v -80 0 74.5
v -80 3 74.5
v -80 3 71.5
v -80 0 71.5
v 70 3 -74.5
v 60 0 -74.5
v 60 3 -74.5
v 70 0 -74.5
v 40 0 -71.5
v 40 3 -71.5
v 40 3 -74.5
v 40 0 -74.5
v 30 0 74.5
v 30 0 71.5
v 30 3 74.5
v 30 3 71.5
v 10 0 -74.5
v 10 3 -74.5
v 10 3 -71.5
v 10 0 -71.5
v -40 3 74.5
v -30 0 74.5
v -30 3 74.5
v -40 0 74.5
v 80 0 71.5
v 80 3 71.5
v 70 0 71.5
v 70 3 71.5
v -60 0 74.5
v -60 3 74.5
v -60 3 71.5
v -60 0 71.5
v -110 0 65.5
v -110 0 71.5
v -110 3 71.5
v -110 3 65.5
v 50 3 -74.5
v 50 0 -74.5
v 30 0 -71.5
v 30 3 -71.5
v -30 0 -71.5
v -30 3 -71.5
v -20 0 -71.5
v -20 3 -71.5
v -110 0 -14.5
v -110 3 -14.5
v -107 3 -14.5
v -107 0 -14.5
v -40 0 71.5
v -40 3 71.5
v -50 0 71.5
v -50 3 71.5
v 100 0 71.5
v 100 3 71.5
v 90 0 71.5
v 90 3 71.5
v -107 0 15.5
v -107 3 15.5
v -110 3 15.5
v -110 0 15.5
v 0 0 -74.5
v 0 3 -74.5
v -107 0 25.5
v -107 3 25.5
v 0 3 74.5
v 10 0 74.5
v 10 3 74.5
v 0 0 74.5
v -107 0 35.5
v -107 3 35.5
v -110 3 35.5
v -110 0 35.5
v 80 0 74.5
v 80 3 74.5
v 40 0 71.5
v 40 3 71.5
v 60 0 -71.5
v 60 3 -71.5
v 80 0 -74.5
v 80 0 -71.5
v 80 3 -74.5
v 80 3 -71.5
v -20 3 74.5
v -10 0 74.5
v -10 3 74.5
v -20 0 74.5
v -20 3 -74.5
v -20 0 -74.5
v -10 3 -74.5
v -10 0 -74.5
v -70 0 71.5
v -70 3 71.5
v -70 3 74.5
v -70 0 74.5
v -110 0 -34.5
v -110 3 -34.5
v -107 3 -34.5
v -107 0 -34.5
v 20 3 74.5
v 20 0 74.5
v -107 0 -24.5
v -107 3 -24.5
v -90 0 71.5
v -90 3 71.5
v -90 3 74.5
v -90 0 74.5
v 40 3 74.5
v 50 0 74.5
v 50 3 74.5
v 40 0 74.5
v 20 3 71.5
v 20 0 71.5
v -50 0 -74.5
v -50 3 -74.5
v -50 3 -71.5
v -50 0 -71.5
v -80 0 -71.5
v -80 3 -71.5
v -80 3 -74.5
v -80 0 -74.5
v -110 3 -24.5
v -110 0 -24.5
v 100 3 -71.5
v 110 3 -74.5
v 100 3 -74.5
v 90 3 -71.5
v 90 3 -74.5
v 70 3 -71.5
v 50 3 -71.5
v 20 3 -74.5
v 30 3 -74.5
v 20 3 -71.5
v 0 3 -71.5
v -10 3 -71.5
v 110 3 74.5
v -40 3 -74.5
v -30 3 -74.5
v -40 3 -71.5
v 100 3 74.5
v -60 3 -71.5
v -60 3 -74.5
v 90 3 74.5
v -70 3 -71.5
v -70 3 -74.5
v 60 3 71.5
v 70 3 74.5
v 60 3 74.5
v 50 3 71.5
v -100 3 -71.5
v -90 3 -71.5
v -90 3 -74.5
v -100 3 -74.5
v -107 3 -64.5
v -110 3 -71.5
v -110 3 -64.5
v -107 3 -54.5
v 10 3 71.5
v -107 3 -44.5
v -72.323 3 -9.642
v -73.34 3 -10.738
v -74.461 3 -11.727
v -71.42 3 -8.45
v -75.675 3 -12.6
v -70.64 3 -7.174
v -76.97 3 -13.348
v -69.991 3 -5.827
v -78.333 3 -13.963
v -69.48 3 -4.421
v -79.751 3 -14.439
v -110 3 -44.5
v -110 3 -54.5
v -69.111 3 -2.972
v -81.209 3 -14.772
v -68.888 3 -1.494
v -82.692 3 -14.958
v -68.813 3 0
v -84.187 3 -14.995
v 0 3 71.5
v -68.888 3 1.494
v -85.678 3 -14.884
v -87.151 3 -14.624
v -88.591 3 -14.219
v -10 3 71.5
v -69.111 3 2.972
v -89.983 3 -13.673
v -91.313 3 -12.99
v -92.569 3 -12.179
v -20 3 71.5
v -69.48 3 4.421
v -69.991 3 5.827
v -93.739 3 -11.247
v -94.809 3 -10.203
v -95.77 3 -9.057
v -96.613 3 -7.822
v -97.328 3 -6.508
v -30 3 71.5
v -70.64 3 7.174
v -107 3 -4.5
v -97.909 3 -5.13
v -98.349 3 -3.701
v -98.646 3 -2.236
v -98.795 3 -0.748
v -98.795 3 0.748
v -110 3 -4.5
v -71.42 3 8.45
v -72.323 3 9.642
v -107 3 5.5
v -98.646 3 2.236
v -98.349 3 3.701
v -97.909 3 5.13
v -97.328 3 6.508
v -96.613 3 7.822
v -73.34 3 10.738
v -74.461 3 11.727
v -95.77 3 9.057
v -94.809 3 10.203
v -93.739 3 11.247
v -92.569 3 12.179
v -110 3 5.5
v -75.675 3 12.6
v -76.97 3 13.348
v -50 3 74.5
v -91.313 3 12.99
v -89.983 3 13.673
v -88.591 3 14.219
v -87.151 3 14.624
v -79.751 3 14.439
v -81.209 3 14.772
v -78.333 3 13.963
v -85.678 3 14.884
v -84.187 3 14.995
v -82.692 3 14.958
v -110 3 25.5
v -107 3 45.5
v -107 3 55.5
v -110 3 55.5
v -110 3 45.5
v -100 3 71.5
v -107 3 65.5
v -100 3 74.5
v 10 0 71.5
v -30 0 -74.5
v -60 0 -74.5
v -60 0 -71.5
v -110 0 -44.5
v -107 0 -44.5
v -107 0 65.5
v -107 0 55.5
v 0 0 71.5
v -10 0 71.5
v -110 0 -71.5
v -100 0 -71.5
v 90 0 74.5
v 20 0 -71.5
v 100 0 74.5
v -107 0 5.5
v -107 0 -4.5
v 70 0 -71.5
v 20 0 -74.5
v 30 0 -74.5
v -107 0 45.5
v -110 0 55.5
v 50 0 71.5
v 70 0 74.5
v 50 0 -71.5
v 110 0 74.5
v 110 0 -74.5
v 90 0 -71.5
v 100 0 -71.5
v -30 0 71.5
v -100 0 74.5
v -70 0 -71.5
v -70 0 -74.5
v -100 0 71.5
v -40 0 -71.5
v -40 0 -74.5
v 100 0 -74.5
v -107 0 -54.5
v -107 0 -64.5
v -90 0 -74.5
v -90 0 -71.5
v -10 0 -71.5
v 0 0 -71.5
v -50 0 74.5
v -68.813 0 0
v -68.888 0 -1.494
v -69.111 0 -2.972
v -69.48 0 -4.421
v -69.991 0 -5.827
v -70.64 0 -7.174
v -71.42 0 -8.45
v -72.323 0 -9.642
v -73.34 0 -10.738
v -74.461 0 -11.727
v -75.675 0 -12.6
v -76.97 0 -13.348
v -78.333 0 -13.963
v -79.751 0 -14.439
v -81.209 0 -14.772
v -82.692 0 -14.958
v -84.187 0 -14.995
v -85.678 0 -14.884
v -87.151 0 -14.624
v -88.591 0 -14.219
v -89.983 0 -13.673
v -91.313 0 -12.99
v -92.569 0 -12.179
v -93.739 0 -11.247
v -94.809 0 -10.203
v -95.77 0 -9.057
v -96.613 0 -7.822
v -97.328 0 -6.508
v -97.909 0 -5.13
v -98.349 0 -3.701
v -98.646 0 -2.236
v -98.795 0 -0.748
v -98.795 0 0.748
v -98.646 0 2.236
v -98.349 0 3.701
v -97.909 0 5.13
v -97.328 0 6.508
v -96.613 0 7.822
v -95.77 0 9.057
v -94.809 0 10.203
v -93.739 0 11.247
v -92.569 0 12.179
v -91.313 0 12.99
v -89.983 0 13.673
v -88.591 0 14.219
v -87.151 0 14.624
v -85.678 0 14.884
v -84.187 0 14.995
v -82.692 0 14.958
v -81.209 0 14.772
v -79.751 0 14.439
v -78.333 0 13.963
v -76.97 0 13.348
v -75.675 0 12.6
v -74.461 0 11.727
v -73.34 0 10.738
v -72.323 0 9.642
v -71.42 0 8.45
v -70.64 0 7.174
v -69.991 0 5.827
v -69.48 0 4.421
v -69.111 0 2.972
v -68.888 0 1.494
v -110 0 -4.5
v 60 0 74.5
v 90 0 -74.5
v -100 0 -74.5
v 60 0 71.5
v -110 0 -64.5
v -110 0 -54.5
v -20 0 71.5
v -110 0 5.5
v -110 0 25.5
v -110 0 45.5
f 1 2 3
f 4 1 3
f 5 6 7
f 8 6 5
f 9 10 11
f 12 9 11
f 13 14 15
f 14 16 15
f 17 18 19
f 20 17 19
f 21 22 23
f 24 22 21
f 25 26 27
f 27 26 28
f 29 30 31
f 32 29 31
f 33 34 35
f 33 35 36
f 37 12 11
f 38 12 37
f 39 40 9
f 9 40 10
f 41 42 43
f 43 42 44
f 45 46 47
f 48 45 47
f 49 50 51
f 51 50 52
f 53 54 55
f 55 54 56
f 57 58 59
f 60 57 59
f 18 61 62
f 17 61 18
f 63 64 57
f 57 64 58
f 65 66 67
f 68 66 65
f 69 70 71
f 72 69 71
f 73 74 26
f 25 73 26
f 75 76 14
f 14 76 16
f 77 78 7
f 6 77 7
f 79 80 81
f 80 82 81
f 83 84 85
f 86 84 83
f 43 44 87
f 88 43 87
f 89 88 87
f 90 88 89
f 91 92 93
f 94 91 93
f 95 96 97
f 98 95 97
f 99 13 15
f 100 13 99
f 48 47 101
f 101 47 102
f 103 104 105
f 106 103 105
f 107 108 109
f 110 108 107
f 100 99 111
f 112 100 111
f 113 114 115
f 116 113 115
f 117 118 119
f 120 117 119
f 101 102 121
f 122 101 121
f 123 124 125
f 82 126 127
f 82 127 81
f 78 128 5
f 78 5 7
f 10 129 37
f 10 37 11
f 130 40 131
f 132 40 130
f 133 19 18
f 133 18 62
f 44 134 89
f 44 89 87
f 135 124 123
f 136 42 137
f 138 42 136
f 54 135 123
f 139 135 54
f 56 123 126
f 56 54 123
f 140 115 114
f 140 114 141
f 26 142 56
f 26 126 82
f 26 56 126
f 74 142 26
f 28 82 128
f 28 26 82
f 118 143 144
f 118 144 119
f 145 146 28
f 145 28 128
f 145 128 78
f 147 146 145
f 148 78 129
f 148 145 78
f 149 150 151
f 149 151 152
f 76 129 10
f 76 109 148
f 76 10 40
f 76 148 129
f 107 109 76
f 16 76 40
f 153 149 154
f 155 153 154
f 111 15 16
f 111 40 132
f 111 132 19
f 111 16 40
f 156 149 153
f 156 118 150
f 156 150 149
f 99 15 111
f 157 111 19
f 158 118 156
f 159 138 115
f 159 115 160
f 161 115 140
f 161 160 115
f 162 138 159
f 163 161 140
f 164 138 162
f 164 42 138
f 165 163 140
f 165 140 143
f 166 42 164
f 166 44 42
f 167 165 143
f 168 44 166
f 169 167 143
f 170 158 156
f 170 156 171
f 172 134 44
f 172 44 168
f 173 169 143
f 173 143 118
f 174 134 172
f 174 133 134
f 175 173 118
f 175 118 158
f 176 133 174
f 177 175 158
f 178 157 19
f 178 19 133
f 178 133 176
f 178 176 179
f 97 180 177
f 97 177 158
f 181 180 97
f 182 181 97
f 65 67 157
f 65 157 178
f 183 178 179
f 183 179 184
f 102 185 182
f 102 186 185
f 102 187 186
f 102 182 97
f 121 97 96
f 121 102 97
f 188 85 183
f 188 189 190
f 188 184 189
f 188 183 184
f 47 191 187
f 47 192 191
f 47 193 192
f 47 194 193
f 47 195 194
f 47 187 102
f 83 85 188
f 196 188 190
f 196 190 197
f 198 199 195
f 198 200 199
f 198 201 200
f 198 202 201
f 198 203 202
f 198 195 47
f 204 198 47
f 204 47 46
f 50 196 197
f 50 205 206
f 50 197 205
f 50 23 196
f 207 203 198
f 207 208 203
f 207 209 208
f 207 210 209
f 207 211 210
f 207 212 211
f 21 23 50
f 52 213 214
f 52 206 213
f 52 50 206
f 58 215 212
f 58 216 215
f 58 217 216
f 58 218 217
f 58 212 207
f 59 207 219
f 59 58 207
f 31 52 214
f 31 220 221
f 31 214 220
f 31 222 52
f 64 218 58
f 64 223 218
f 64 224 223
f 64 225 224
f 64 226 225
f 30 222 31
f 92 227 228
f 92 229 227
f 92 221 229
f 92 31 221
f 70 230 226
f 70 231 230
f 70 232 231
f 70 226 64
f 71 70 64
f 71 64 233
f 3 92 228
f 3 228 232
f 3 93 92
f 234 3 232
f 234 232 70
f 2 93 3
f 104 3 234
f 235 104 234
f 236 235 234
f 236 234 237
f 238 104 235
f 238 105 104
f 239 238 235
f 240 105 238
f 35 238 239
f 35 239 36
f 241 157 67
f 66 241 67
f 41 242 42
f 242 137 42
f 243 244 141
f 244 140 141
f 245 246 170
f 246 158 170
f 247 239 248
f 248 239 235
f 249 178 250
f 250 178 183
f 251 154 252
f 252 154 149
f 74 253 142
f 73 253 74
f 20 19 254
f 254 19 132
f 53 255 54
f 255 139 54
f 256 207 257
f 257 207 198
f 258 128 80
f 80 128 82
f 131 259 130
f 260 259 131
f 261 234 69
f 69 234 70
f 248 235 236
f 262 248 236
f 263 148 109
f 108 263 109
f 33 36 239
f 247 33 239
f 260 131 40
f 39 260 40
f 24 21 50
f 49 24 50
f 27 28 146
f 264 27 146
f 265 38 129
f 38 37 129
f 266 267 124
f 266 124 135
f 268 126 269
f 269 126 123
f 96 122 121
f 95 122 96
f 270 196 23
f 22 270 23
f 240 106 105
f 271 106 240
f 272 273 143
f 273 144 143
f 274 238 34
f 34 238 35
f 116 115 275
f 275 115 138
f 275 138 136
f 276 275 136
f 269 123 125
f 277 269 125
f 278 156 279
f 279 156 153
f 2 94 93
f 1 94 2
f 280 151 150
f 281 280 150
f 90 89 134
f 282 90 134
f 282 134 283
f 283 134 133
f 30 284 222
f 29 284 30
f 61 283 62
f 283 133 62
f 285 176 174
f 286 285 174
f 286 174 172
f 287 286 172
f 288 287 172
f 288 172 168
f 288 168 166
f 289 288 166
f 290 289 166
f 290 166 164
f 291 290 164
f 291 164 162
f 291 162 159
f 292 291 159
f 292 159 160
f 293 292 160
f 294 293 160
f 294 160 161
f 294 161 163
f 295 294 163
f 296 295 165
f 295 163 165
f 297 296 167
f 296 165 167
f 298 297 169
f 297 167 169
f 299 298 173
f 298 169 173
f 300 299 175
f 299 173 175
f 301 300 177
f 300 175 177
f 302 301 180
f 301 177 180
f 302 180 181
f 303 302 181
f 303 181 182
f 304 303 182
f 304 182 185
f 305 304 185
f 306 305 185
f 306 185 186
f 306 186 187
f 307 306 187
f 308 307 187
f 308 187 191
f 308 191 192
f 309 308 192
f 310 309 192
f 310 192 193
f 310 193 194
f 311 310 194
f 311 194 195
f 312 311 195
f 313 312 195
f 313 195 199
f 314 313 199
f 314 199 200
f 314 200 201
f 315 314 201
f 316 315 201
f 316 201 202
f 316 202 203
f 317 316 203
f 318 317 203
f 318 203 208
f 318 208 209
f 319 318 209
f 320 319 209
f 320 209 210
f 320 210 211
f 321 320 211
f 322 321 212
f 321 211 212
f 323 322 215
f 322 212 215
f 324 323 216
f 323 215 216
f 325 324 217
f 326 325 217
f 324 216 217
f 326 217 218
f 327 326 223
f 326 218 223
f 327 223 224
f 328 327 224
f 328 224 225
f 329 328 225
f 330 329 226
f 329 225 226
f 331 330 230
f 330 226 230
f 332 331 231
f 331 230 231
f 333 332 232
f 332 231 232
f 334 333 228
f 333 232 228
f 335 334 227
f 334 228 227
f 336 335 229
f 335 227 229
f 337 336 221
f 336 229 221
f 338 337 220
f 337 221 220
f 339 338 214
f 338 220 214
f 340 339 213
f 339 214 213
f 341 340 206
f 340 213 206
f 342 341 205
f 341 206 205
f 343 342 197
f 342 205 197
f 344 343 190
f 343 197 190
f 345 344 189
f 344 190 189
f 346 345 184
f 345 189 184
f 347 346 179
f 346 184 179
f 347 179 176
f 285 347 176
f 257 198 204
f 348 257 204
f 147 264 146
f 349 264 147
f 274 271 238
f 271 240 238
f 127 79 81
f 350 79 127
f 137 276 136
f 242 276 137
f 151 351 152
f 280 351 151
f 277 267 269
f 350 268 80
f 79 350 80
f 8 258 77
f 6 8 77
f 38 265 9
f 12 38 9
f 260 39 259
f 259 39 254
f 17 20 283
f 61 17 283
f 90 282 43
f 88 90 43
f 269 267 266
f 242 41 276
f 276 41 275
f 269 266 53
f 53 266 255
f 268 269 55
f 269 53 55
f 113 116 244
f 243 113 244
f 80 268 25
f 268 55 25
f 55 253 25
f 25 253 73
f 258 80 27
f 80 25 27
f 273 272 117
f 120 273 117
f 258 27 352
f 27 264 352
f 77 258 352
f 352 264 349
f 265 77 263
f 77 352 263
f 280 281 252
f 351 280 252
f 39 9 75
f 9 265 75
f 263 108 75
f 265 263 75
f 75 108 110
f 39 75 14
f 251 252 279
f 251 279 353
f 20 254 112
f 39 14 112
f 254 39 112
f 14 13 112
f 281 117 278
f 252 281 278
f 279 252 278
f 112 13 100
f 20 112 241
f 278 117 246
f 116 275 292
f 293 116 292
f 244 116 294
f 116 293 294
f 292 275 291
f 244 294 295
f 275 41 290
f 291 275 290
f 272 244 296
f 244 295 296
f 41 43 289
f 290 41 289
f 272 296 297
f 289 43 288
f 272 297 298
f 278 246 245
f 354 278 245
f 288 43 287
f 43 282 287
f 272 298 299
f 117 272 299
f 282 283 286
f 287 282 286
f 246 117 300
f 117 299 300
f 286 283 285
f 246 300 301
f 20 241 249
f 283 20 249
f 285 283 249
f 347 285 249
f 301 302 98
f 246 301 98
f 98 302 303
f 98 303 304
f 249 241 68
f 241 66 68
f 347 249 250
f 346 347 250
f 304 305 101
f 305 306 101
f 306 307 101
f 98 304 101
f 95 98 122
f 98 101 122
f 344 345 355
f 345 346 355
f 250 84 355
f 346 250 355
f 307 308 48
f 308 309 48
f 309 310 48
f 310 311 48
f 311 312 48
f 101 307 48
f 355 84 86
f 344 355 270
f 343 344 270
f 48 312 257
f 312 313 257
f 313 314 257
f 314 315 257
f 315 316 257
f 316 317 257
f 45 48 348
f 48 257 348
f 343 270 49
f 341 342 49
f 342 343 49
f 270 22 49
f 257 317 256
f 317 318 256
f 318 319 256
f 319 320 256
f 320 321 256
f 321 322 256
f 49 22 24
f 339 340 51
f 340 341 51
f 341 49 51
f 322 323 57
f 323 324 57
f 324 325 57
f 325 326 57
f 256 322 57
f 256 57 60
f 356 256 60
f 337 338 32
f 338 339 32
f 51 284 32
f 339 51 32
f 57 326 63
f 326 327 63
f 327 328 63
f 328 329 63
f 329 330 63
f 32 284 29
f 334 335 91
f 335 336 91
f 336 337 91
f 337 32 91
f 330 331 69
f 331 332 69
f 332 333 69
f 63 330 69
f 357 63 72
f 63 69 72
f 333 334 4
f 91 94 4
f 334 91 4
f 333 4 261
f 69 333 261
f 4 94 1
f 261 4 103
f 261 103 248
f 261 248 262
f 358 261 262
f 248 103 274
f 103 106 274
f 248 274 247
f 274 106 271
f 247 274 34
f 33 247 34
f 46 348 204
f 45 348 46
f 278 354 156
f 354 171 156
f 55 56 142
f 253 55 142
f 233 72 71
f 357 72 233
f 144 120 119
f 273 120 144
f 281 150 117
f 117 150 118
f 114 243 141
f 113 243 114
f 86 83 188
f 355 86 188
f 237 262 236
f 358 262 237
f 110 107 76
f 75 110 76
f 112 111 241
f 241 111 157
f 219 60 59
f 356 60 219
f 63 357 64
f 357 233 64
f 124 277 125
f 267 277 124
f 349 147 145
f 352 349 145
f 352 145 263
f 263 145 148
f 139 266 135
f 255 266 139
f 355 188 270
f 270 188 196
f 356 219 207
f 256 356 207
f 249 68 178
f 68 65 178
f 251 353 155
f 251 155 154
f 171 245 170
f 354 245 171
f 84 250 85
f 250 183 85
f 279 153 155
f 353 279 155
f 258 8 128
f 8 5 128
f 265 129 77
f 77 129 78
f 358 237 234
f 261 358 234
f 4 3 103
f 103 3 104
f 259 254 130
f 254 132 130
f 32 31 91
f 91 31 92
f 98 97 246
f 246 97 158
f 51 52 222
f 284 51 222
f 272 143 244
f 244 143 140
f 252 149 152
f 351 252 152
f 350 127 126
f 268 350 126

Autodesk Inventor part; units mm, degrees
ref_plane "YZ Plane" through (0, 0, 0) normal (1, 0, 0) x (0, 1, 0)
ref_plane "XZ Plane" through (0, 0, 0) normal (0, 1, 0) x (-1, 0, 0)
ref_plane "XY Plane" through (0, 0, 0) normal (0, 0, 1) x (1, 0, 0)
sketch "Эскиз5" plane through (0, 0, 0) normal (0, 1, 0) x (-1, 0, 0)
  line L0 (-110, 74.5) -> (110, 74.5)
  line L1 (110, 74.5) -> (110, -74.5)
  line L2 (110, -74.5) -> (-110, -74.5)
  line L3 (-110, -74.5) -> (-110, 74.5)
  line L4 (-110, 74.5) -> (110, -74.5) construction
  line L5 (110, 74.5) -> (-110, -74.5) construction
  point P0 (0, 0)
  dimension "d25" = 220
  dimension "d26" = 149
extrude "Выдавливание5" add sketch "Эскиз5" along normal blind 3
sketch "Эскиз6" plane through (0, 3, 0) normal (0, 1, 0) x (1, 0, 0)
  line L0 (-110, 74.5) -> (-110, -74.5) projected
  line L1 (-110, -65.5) -> (-107, -65.5)
  line L2 (-107, -65.5) -> (-107, -55.5)
  line L3 (-107, -55.5) -> (-110, -55.5)
  line L4 (-110, -55.5) -> (-110, -65.5)
  line L5 (-110, -74.5) -> (110, -74.5) projected
  point P0 (0, 0)
  point P1 (-107, -74.5)
  point P2 (-110, -65.5)
  dimension "d29" = 3
  dimension "d30" = 10
  dimension "d46" = 9
extrude "Выдавливание6" cut sketch "Эскиз6" against normal blind 3
pattern_linear "Прямоуг.массив6" count 7 spacing 20 along (0, 0, -1) of "Выдавливание6"
sketch "Эскиз8" plane through (0, 3, 0) normal (0, 1, 0) x (1, 0, 0)
  line L0 (-110, -74.5) -> (110, -74.5) projected
  line L1 (-110, -74.5) -> (-100, -74.5)
  line L2 (-100, -74.5) -> (-100, -71.5)
  line L3 (-100, -71.5) -> (-110, -71.5)
  line L4 (-110, -71.5) -> (-110, -74.5)
  line L5 (-107, -55.5) -> (-107, -65.5) projected
  point P0 (0, 0)
  dimension "d50" = 3
  dimension "d51" = 10
  dimension "d52" = 3
extrude "Выдавливание8" cut sketch "Эскиз8" against normal blind 3
pattern_linear "Прямоуг.массив7" count 11 spacing 20 along (1, 0, 0) of "Выдавливание8"
mirror "Зеркальное отражение2" about plane through (0, 0, 0) normal (0, 0, 1) of "Выдавливание8", "Прямоуг.массив7"
sketch "Эскиз9" plane through (0, 3, 0) normal (0, 1, 0) x (1, 0, 0)
  circle A0 centre (-83.8133, 0) radius 15
  point P0 (0, 0)
  dimension "d58" = 30
extrude "Выдавливание9" cut sketch "Эскиз9" against normal blind 3
properties part number "000.104 - Cap"
